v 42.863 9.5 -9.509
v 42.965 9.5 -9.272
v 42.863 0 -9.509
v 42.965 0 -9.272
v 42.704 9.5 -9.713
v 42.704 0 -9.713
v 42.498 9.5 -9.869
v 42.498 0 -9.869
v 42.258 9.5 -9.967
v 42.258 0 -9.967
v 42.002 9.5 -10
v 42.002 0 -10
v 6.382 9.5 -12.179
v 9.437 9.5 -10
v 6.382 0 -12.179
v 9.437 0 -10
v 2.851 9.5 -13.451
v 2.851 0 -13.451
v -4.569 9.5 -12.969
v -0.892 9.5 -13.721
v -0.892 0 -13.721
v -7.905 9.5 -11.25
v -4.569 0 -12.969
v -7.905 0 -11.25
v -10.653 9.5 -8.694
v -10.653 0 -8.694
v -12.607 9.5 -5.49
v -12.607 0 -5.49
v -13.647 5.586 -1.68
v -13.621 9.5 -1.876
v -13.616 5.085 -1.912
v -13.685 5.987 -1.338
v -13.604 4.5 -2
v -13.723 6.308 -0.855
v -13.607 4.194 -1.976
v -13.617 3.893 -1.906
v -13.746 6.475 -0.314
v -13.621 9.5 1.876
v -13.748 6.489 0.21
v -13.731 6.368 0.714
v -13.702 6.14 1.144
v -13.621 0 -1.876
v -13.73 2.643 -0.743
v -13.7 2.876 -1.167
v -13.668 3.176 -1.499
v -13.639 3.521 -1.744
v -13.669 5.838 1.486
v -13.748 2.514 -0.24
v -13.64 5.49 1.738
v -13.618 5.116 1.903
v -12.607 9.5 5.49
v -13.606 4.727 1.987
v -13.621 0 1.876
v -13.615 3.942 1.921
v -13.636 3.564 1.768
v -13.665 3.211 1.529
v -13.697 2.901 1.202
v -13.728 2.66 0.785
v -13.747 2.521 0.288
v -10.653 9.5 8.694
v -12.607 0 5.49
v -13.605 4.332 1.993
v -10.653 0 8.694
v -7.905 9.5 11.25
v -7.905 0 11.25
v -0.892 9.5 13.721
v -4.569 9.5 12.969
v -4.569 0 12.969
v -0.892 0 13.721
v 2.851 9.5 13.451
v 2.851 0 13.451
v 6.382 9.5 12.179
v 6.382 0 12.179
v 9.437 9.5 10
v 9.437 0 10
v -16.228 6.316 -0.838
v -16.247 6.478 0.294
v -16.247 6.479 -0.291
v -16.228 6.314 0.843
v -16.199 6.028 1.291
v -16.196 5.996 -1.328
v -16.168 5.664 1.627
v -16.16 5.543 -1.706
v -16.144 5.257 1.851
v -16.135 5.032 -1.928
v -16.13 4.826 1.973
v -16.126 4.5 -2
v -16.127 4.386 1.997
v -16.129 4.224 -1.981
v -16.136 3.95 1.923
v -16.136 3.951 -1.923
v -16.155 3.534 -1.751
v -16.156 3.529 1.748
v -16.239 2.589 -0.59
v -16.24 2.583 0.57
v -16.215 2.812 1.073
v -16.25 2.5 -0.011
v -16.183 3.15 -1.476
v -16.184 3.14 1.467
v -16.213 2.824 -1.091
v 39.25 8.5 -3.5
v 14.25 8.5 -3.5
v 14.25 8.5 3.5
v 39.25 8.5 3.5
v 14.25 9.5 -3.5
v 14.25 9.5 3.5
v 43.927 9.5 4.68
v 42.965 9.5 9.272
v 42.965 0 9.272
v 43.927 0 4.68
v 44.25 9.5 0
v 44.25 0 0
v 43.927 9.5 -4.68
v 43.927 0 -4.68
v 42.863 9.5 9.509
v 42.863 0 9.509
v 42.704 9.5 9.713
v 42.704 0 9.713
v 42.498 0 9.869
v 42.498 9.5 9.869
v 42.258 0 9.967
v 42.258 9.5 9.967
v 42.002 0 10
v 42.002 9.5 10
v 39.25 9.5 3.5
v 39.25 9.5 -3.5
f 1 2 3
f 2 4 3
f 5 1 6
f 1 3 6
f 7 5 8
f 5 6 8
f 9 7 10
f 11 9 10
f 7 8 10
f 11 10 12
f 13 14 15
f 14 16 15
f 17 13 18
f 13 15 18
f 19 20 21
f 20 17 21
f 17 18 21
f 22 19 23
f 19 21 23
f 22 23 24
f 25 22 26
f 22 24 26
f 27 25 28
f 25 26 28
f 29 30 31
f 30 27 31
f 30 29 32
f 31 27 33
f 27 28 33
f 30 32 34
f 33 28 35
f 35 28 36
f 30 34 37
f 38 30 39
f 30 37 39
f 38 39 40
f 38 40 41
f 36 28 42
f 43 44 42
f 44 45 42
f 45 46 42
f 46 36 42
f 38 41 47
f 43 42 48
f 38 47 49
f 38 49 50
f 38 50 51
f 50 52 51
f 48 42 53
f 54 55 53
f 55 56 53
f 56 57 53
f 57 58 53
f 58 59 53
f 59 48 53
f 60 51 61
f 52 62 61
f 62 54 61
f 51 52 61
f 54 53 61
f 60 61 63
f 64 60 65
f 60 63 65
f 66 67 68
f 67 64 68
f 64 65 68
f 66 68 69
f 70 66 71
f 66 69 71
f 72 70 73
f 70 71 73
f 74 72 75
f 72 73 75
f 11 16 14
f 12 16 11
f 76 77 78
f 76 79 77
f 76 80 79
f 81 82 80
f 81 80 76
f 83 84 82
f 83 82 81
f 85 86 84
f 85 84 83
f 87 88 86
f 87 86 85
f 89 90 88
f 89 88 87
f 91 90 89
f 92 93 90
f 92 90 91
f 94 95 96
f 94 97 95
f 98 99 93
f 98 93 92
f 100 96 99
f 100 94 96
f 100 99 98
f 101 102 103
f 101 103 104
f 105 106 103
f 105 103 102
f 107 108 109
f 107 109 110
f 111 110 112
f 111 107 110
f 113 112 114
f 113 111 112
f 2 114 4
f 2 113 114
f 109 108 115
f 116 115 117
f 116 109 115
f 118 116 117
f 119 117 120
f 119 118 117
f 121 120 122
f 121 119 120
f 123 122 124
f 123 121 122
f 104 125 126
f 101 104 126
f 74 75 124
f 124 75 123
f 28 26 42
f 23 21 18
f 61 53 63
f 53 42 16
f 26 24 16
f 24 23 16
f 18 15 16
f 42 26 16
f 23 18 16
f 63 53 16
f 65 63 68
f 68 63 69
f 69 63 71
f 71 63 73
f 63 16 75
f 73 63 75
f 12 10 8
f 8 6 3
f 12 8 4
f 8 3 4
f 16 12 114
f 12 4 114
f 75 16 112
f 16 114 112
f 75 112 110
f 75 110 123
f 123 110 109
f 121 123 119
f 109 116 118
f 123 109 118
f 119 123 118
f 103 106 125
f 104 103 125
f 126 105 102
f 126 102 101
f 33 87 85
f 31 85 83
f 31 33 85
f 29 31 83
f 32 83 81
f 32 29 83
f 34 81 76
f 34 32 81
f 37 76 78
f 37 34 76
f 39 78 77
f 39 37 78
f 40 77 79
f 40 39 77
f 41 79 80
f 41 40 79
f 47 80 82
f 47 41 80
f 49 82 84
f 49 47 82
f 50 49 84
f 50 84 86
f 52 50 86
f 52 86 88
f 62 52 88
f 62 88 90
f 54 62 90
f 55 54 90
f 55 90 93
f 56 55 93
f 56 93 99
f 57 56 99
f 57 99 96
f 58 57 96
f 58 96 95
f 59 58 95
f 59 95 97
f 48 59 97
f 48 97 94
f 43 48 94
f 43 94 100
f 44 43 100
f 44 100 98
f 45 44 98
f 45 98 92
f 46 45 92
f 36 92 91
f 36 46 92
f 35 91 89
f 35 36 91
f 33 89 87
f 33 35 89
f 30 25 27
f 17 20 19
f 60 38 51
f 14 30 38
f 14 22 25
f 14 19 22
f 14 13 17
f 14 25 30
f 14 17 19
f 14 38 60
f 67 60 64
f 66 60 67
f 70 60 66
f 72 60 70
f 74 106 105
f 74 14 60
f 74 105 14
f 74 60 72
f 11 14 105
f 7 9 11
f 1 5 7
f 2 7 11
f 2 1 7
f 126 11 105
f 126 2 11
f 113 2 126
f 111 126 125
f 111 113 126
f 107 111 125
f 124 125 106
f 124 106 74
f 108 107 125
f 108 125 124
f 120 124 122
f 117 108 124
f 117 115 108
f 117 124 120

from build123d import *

# Parameters (mm, degrees)
SKETCH1_R                = 13.75
BOSS_EXTRUDE1_DEPTH      = 9.5
SKETCH2_W                = 44.25
SKETCH2_H                = 20
BOSS_EXTRUDE2_DEPTH      = 9.5
BOSS_EXTRUDE3_REACH      = 49.301
BOSS_EXTRUDE3_END_RADIUS = 16.25
SKETCH3_R                = 2
SKETCH4_W                = 25
SKETCH4_H                = 7
CUT_EXTRUDE1_DEPTH       = 1
CUT_EXTRUDE2_DEPTH       = 48.300898561
FILLET1_R                = 1


with BuildPart() as part:
    # Sketch1 → Boss-Extrude1 (new body)
    with BuildSketch(Plane(origin=(0, 0, 0), x_dir=(1, 0, 0), z_dir=(0, 1, 0))):
        with Locations(Location((0, 0, 0), (0, 0, 270))):
            Circle(SKETCH1_R)
    extrude(amount=BOSS_EXTRUDE1_DEPTH)

    # Sketch2 → Boss-Extrude2 (add)
    with BuildSketch(Plane(origin=(0, 0, 0), x_dir=(1, 0, 0), z_dir=(0, 1, 0))):
        with Locations((22.125, 0)):
            Rectangle(SKETCH2_W, SKETCH2_H)
    extrude(amount=BOSS_EXTRUDE2_DEPTH)

    # Boss-Extrude3: up to this cylinder (the profile starts inside it)
    boss_extrude3_end = Plane(origin=(0, 4.5, 0), z_dir=(0, -1, 0)) * Cylinder(BOSS_EXTRUDE3_END_RADIUS, 132.102, mode=Mode.PRIVATE)
    # Sketch3 → Boss-Extrude3 (add, up to the surface)
    with BuildSketch(Plane(origin=(0, 0, 0), x_dir=(0, 0, -1), z_dir=(1, 0, 0)), mode=Mode.PRIVATE) as boss_extrude3_sk1:
        with Locations((0, 4.5)):
            Circle(SKETCH3_R)
    boss_extrude3_tool1 = extrude(boss_extrude3_sk1.sketch, amount=-BOSS_EXTRUDE3_REACH, mode=Mode.PRIVATE) & boss_extrude3_end
    add(boss_extrude3_tool1.solids().sort_by_distance((0, 4.5, 0))[0])

    # Sketch4 → Cut-Extrude1 (cut)
    with BuildSketch(Plane(origin=(0, 9.5, 0), x_dir=(1, 0, 0), z_dir=(0, 1, 0))):
        with Locations((26.75, 0)):
            Rectangle(SKETCH4_W, SKETCH4_H)
    extrude(amount=-CUT_EXTRUDE1_DEPTH, mode=Mode.SUBTRACT)

    # Sketch5 → Cut-Extrude2 (cut, through all)
    with BuildSketch(Plane(origin=(0, 9.5, 0), x_dir=(1, 0, 0), z_dir=(0, 1, 0))):
        with BuildLine():
            Line((42.75, 10), (47.75, 10))
            Line((47.75, 10), (47.75, -10))
            Line((47.75, -10), (42.75, -10))
            ThreePointArc((42.75, -10), (44.25, 0), (42.75, 10))
        make_face()
    extrude(amount=-CUT_EXTRUDE2_DEPTH, mode=Mode.SUBTRACT)

    # Fillet1
    fillet1_edges = [part.edges().sort_by_distance(p)[0] for p in [
        (42.75, 4.75, 10),
        (42.75, 4.75, -10),
    ]]
    fillet(fillet1_edges, radius=FILLET1_R)


solid = part.part
